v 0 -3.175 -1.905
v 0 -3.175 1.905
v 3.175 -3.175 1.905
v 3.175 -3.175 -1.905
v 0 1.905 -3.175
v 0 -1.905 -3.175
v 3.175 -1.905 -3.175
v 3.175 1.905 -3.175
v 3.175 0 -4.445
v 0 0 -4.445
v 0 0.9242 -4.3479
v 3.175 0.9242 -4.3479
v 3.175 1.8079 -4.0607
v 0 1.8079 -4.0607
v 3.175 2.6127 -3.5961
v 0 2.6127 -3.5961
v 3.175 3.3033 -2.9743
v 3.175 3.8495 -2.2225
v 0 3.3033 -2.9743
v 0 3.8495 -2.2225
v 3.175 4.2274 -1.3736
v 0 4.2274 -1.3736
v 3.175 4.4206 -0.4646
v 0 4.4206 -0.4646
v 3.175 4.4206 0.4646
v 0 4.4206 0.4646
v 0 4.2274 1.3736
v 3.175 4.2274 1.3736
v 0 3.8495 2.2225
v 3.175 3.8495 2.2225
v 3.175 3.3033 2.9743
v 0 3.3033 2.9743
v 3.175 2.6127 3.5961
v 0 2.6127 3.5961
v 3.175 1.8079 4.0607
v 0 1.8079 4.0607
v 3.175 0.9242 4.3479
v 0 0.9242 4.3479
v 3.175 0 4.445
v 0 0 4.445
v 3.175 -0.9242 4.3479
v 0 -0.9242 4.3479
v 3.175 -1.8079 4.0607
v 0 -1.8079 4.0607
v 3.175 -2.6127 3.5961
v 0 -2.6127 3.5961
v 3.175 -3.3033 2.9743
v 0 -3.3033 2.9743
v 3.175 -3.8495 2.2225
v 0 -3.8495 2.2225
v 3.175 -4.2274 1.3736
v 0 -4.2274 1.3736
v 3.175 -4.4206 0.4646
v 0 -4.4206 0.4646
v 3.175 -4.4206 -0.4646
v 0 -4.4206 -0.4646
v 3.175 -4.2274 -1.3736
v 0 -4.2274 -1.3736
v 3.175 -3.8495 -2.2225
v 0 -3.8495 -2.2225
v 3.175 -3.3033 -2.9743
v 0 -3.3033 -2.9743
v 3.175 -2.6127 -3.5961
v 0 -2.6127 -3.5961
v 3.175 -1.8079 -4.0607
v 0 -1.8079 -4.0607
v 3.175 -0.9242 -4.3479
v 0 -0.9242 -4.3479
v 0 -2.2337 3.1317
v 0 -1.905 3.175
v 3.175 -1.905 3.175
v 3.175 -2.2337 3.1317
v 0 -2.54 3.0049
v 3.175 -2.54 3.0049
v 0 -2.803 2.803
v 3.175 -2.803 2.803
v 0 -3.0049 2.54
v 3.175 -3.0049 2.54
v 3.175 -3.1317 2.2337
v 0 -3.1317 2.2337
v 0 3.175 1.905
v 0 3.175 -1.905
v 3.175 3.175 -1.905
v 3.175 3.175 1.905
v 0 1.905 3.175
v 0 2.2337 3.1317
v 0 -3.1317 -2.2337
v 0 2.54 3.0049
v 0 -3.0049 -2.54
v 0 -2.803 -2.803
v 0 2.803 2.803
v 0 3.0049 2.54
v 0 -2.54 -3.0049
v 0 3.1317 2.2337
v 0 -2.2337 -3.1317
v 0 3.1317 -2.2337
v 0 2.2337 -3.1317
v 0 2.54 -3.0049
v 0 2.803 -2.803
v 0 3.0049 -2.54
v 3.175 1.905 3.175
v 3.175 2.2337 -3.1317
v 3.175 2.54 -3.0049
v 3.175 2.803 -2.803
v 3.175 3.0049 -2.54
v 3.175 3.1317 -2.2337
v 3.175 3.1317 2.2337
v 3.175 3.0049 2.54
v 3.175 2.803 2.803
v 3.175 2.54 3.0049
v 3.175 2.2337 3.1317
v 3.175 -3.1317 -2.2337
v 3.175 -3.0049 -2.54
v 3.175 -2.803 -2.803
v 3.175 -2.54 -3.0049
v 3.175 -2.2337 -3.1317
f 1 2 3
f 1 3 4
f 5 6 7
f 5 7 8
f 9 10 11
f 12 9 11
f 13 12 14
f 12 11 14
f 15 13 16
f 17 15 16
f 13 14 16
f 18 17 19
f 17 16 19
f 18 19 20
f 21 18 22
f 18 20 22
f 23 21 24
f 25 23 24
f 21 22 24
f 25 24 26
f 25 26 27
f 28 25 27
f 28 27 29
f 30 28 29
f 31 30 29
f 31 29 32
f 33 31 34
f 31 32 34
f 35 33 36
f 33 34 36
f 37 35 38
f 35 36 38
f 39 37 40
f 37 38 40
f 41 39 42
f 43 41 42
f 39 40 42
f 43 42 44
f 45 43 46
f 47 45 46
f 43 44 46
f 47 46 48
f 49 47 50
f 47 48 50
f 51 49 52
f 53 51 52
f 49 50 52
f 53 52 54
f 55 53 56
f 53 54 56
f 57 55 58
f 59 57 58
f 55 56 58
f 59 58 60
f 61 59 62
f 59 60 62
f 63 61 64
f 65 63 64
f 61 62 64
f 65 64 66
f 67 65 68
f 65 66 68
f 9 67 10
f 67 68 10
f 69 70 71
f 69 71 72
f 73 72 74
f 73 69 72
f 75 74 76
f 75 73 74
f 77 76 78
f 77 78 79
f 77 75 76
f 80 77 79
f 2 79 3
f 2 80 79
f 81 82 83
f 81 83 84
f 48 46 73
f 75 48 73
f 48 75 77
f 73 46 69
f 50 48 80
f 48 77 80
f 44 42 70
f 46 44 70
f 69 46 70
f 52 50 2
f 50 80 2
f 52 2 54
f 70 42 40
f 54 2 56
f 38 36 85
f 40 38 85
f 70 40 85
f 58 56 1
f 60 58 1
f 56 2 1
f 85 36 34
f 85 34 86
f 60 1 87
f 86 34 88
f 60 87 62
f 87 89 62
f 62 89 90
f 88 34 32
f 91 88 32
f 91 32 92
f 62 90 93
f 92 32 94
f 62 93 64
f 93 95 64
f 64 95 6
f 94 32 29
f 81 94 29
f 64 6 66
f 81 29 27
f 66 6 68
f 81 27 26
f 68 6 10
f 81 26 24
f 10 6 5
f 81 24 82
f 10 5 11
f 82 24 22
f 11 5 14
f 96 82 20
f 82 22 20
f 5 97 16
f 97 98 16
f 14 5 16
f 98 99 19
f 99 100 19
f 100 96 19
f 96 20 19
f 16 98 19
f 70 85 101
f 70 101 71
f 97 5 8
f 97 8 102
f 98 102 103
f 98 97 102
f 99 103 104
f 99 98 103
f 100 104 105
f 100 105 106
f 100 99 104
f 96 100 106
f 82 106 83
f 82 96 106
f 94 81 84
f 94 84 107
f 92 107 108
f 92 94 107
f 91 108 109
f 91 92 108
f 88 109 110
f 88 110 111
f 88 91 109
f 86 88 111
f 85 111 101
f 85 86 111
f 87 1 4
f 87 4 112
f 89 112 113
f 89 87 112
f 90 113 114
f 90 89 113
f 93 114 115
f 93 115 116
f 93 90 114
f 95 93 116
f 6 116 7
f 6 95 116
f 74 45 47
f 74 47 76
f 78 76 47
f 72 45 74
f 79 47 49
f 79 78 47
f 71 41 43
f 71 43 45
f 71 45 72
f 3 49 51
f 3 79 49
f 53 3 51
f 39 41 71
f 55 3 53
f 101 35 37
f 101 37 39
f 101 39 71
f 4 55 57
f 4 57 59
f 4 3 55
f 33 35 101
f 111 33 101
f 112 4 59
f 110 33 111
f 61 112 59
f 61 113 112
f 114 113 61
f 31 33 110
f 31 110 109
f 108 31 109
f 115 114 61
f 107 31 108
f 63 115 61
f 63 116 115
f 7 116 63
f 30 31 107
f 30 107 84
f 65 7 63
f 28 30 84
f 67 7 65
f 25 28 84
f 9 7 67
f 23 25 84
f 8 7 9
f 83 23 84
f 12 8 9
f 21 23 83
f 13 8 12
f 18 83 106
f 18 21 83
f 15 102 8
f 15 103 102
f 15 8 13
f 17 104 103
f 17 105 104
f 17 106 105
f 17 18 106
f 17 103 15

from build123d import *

# Parameters (mm, degrees)
SKETCH2_R           = 4.445
BOSS_EXTRUDE1_DEPTH = 3.175


with BuildPart() as part:
    # Sketch2 → Boss-Extrude1 (new body)
    with BuildSketch(Plane(origin=(0, 0, 0), x_dir=(0, 0, -1), z_dir=(1, 0, 0))):
        Circle(SKETCH2_R)
        with BuildLine():
            Line((1.905, 3.175), (-1.905, 3.175))
            ThreePointArc((-1.905, 3.175), (-2.803025612, 2.803025612), (-3.175, 1.905))
            Line((-3.175, 1.905), (-3.175, -1.905))
            ThreePointArc((-3.175, -1.905), (-2.803025612, -2.803025612), (-1.905, -3.175))
            Line((-1.905, -3.175), (1.905, -3.175))
            ThreePointArc((1.905, -3.175), (2.803025612, -2.803025612), (3.175, -1.905))
            Line((3.175, -1.905), (3.175, 1.905))
            ThreePointArc((3.175, 1.905), (2.803025612, 2.803025612), (1.905, 3.175))
        make_face(mode=Mode.SUBTRACT)
    extrude(amount=BOSS_EXTRUDE1_DEPTH)


solid = part.part
